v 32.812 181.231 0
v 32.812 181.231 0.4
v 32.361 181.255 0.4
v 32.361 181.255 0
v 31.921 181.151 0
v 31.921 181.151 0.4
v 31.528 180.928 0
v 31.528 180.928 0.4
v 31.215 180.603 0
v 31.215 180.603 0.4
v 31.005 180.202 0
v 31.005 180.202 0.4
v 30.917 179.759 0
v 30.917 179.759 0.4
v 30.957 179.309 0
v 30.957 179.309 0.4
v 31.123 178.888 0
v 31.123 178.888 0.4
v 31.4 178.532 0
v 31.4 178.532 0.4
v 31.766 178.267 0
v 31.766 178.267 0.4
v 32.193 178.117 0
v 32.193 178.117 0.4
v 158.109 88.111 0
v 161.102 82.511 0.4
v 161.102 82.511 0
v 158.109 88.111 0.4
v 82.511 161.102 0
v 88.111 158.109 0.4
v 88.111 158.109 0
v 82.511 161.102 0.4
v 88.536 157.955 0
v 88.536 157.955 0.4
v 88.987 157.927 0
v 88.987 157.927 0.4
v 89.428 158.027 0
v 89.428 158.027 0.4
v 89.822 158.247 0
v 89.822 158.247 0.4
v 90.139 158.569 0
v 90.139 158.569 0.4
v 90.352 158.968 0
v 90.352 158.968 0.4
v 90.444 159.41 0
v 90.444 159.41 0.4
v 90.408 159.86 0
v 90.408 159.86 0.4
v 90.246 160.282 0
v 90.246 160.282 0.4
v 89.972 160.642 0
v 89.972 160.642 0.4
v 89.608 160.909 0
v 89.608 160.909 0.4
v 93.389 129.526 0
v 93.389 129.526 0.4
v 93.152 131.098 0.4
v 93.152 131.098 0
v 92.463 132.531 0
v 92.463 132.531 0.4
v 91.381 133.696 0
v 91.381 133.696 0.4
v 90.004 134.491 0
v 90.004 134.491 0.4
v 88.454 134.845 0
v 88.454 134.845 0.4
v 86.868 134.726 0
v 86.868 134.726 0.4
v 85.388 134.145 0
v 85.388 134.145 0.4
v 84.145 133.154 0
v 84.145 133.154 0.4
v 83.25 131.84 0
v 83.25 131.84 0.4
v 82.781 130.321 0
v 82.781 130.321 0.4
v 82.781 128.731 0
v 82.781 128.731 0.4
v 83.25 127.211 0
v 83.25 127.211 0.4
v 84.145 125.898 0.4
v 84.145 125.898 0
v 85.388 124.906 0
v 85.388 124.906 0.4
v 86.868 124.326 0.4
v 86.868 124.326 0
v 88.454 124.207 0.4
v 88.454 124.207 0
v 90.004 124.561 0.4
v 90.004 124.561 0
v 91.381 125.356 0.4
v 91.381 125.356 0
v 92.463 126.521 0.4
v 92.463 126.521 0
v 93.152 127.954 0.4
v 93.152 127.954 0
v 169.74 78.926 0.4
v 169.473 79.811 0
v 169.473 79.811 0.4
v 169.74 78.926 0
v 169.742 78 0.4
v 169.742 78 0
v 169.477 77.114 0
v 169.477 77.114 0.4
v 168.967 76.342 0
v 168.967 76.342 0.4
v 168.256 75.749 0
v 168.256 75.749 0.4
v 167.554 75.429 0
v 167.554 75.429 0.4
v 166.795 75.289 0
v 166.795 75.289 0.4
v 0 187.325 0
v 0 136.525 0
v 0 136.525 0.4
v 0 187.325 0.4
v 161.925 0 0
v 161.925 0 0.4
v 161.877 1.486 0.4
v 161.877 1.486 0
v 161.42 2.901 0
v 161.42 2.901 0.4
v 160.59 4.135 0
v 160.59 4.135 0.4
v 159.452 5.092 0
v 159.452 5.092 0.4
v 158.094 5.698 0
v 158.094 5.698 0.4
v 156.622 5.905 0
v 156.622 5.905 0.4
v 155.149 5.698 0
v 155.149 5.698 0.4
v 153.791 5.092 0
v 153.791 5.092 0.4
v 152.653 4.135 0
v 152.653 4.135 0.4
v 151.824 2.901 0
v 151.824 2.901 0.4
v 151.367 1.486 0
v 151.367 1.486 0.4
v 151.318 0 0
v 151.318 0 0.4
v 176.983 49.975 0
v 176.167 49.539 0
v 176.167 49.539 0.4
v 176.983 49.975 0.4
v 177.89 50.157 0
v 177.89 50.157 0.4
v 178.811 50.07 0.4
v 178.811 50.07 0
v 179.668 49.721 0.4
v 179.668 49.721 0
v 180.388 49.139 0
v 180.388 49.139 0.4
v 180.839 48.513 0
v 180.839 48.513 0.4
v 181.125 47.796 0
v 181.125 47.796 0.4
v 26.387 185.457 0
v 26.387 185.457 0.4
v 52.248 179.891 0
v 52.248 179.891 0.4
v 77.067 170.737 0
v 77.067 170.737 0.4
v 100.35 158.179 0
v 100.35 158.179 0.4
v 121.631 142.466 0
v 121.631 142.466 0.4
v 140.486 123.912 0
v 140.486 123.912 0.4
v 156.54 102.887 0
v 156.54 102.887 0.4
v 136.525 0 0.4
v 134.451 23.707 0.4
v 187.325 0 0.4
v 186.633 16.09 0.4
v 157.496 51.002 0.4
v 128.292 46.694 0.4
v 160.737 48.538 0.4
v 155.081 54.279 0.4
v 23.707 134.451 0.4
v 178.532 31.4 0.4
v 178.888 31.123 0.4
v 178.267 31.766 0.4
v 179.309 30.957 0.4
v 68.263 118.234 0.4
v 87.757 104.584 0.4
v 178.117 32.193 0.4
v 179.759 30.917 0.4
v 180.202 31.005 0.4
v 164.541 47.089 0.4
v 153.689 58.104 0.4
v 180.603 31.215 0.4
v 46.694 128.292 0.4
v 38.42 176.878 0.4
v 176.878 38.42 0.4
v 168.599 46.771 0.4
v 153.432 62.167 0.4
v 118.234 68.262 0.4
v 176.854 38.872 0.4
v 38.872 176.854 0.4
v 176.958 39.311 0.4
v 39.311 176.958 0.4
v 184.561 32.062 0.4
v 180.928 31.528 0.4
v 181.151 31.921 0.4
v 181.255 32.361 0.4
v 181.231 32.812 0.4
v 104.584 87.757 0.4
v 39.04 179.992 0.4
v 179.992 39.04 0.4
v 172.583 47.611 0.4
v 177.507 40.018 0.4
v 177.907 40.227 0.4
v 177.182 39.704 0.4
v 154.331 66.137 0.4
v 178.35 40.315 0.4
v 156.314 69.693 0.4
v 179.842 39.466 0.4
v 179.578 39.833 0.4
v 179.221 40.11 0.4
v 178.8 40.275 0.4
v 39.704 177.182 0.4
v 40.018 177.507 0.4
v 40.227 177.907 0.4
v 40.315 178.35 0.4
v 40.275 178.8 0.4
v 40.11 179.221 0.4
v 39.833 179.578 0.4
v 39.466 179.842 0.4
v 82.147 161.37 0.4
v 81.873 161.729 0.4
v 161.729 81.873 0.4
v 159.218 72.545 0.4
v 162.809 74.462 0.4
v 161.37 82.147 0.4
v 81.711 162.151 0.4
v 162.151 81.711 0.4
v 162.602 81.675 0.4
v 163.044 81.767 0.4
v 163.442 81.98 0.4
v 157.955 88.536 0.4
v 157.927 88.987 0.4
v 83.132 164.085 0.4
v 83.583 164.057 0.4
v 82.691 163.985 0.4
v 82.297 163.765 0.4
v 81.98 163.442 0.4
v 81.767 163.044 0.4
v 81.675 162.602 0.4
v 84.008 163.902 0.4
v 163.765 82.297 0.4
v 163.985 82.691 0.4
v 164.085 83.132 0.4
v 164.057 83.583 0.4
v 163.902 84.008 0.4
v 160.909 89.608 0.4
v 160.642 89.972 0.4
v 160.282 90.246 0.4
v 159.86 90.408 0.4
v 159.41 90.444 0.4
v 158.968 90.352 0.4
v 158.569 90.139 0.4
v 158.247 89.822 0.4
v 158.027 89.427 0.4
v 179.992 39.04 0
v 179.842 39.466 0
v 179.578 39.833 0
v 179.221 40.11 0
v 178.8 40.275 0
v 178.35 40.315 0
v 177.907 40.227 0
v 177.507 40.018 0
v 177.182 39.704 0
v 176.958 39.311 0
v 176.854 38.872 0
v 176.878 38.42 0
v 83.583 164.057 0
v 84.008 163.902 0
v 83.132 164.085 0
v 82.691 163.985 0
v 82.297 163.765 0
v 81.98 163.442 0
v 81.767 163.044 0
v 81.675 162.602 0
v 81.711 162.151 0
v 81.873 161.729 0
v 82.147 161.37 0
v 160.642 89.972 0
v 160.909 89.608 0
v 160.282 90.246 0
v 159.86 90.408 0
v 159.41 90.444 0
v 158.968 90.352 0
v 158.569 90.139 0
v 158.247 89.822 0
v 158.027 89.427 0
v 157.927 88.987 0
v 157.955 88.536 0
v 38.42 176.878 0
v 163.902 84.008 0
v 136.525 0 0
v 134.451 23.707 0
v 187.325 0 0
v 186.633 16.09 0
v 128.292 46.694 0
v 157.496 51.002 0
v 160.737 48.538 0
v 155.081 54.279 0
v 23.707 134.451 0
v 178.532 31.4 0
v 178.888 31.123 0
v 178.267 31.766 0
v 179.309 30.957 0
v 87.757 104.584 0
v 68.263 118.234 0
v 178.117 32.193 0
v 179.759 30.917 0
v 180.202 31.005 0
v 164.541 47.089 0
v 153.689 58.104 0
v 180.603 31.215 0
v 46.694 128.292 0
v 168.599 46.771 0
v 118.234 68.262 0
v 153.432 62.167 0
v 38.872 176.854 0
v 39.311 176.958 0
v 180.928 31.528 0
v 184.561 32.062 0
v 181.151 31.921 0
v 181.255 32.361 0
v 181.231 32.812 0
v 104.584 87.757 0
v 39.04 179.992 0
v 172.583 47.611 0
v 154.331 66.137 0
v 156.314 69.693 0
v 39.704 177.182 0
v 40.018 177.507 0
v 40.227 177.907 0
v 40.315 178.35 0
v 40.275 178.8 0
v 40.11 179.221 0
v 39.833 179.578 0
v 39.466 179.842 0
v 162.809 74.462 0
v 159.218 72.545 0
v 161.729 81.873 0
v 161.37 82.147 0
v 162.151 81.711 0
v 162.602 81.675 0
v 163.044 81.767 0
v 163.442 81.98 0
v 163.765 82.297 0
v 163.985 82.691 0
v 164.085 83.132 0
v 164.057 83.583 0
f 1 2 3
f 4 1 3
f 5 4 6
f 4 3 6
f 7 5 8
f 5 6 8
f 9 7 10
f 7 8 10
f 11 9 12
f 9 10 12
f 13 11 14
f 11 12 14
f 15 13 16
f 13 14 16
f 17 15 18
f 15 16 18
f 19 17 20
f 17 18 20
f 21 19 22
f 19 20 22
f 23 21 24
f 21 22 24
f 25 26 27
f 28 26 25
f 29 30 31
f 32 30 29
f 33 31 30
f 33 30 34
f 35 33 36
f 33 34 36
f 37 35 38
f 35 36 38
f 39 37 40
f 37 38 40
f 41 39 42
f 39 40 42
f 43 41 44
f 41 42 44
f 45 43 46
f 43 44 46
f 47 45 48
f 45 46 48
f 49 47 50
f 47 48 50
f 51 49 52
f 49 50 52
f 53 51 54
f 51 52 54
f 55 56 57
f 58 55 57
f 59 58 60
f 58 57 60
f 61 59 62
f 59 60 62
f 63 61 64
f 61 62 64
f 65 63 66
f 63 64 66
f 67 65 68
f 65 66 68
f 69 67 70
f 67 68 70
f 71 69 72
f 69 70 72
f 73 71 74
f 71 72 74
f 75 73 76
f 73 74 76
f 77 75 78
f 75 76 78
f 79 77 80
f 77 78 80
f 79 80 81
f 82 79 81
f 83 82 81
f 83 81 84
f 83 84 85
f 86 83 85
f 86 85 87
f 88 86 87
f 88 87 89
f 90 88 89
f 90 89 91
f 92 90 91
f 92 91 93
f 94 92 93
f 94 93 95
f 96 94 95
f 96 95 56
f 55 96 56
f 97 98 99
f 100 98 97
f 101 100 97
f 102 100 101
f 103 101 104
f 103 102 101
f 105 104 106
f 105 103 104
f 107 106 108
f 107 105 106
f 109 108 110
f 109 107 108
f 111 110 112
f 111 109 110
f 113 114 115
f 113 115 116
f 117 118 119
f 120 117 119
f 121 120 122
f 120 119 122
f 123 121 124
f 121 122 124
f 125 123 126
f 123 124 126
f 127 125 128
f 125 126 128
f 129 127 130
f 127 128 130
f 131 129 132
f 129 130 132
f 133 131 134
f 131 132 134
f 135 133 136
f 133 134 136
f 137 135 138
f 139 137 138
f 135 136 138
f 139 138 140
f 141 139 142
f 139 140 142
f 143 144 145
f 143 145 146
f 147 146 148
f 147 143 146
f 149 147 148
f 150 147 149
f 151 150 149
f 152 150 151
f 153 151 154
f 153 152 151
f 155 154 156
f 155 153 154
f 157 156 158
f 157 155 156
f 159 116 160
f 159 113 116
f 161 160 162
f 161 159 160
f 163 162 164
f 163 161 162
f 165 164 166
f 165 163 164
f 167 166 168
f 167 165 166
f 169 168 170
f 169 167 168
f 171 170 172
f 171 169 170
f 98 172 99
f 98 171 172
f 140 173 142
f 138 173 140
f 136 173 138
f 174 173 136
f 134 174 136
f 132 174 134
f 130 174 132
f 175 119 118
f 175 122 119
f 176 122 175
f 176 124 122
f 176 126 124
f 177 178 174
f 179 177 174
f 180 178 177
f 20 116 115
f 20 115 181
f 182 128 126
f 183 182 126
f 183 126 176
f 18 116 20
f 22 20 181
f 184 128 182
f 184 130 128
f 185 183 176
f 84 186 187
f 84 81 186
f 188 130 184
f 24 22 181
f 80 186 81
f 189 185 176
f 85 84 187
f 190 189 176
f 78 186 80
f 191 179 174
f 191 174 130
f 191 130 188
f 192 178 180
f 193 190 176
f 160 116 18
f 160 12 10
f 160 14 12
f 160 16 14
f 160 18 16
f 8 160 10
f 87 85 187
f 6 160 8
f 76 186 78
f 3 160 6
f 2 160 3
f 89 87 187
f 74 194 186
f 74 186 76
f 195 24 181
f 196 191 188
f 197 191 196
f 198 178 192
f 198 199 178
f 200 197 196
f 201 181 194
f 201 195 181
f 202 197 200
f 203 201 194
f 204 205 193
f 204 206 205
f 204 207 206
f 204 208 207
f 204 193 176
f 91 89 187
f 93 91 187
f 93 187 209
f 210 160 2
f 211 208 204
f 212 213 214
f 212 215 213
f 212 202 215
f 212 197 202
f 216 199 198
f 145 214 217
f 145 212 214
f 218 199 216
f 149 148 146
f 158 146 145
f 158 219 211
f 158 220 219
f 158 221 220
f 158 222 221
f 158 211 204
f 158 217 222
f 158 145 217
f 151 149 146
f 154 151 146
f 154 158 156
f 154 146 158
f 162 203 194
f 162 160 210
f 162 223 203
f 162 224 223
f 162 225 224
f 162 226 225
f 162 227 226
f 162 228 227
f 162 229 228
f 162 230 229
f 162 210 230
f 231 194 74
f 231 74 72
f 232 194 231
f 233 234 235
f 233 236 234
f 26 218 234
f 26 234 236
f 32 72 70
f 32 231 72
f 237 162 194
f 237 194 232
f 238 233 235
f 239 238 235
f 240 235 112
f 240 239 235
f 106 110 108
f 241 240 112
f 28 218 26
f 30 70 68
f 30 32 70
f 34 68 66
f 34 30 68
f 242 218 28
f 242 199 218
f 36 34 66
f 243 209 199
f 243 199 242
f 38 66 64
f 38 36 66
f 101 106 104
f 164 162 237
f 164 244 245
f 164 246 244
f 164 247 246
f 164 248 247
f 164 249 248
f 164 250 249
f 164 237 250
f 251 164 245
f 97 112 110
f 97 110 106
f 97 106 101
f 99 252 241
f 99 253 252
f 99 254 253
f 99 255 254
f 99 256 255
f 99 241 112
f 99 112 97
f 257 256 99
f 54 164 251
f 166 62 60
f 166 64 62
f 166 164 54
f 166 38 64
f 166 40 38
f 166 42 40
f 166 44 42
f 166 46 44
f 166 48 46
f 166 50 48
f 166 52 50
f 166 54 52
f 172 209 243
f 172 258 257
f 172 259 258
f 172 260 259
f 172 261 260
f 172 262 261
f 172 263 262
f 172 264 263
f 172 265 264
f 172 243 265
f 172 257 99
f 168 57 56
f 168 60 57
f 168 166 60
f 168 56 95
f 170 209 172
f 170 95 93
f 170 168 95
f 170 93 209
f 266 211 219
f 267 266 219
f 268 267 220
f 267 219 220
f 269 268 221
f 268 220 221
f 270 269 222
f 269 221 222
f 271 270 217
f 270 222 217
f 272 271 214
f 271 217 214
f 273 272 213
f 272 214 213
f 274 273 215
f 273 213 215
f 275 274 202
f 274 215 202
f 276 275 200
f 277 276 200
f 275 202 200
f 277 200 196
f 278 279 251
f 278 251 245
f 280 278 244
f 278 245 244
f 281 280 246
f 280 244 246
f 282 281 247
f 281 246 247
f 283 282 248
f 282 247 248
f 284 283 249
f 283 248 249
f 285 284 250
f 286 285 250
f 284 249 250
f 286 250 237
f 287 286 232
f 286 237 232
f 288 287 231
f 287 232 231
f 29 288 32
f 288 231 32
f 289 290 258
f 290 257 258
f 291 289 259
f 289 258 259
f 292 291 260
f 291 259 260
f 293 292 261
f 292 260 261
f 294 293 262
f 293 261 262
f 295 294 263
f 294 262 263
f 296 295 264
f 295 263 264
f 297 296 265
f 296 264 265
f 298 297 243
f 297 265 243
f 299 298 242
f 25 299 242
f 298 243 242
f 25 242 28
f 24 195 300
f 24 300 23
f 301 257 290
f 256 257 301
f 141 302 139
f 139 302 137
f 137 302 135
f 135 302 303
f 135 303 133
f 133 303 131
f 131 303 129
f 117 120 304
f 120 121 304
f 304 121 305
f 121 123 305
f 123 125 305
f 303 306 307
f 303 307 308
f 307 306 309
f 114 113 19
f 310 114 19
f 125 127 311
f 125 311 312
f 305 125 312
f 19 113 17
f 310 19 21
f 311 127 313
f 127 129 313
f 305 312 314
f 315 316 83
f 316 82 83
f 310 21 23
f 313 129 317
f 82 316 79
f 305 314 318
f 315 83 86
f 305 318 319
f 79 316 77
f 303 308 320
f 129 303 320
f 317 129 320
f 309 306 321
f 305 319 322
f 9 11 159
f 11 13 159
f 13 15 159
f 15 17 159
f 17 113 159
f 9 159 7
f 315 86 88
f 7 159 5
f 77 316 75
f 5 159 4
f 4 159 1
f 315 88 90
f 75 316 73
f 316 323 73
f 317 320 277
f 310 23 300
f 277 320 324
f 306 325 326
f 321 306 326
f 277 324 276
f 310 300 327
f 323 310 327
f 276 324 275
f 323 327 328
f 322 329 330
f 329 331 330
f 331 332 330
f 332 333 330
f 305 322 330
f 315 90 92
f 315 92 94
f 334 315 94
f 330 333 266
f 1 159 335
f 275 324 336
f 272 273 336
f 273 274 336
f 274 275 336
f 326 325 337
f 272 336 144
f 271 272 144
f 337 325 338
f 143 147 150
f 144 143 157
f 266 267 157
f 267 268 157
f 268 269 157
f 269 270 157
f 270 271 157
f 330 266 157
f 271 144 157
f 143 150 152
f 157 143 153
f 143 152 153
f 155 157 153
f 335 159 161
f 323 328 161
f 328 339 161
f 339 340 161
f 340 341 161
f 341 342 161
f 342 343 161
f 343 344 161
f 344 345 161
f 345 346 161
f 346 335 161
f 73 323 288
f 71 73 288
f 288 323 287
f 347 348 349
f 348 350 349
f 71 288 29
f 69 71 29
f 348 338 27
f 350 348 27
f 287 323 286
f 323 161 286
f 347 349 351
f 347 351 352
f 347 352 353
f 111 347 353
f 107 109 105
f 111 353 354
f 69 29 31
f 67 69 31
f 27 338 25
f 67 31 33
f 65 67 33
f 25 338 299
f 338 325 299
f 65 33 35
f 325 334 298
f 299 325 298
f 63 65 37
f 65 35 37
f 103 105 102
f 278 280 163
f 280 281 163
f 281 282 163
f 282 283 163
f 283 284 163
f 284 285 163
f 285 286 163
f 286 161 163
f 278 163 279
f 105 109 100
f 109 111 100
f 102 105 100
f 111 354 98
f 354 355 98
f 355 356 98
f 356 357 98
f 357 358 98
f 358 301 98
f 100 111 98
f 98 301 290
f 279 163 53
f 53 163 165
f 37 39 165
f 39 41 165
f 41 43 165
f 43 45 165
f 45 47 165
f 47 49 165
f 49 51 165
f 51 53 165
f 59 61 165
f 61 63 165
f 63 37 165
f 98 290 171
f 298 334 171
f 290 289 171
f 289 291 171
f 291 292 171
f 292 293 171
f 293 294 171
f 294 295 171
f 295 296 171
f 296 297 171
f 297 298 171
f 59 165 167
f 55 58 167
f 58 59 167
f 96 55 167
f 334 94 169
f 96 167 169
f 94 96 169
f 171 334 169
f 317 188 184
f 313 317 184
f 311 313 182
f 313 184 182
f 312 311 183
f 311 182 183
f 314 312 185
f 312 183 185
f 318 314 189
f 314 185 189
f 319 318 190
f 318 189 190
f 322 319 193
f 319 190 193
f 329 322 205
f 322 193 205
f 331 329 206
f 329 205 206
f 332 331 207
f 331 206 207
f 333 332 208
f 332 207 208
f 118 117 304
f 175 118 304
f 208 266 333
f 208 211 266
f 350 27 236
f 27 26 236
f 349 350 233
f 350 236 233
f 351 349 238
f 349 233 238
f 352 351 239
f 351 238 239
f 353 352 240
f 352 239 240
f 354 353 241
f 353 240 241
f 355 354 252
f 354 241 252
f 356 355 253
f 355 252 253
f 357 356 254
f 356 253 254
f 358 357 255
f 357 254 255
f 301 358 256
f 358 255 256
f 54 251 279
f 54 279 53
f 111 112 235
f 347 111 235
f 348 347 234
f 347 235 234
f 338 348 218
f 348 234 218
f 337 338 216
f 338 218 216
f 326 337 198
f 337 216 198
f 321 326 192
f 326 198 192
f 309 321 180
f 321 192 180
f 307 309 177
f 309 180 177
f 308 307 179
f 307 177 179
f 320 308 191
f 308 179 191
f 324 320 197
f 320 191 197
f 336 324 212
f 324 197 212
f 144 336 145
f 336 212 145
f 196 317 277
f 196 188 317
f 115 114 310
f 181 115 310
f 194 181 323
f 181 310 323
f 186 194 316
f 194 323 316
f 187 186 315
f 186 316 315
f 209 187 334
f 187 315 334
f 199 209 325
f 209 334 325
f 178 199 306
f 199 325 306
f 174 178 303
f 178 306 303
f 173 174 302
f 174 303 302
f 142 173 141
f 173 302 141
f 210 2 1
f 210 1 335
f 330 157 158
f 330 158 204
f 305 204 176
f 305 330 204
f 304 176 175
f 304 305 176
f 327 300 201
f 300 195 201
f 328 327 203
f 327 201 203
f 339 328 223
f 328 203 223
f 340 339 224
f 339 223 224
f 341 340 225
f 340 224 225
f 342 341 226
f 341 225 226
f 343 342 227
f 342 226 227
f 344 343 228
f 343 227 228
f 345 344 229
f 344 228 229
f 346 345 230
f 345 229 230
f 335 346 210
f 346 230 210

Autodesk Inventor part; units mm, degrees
ref_plane "YZ Plane" through (0, 0, 0) normal (1, 0, 0) x (0, 1, 0)
ref_plane "XZ Plane" through (0, 0, 0) normal (0, 1, 0) x (-1, 0, 0)
ref_plane "XY Plane" through (0, 0, 0) normal (0, 0, 1) x (1, 0, 0)
sketch "Sketch1" plane through (0, 0, 0) normal (0, 0, 1) x (1, 0, 0)
  arc A0 (187.325, 0) -> (0, 187.325) centre (0, 0) ccw
  arc A1 (136.525, 0) -> (0, 136.525) centre (0, 0) ccw
  line L0 (0, 136.525) -> (0, 187.325)
  line L1 (136.525, 0) -> (187.325, 0)
  point P0 (161.925, 0)
  point P1 (0, 161.925)
  dimension "d2" = 187.325
  dimension "d3" = 136.525
extrude "Extrusion1" add sketch "Sketch1" along normal blind 0.4
sketch "Sketch3" plane through (0, 0, 0.4) normal (0, 0, 1) x (1, 0, 0)
  arc A0 (178.117, 32.1925) -> (181.231, 32.8119) centre (179.674, 32.5022) ccw projected
  line L0 (179.9922, 39.0399) -> (181.231, 32.8119) projected
  arc A1 (179.9922, 39.0399) -> (176.8782, 38.4205) centre (178.4352, 38.7302) ccw projected
  line L1 (178.117, 32.1925) -> (176.8782, 38.4205) projected
  line L2 (161.1024, 82.5109) -> (158.109, 88.1111) projected
  arc A2 (161.1024, 82.5109) -> (163.9025, 84.0076) centre (162.5024, 83.2593) ccw projected
  line L3 (160.9091, 89.6078) -> (163.9025, 84.0076) projected
  arc A3 (160.9091, 89.6078) -> (158.109, 88.1111) centre (159.5091, 88.8595) ccw projected
  circle A4 centre (156.6217, 0.5713) radius 5.334 projected
  line L4 (84.0076, 163.9025) -> (89.6078, 160.9091) projected
  arc A5 (88.1111, 158.109) -> (89.6078, 160.9091) centre (88.8595, 159.5091) ccw projected
  line L5 (88.1111, 158.109) -> (82.5109, 161.1024) projected
  arc A6 (84.0076, 163.9025) -> (82.5109, 161.1024) centre (83.2593, 162.5024) ccw projected
  line L6 (32.8119, 181.231) -> (39.0399, 179.9922) projected
  arc A7 (38.4205, 176.8782) -> (39.0399, 179.9922) centre (38.7302, 178.4352) ccw projected
  line L7 (38.4205, 176.8782) -> (32.1925, 178.117) projected
  arc A8 (32.8119, 181.231) -> (32.1925, 178.117) centre (32.5022, 179.674) ccw projected
  circle A9 centre (88.0554, 129.5258) radius 5.334 projected
  circle A10 centre (167.6741, 61.0284) radius 8.89 projected
  circle A11 centre (167.6741, 61.0284) radius 14.2875
  point P0 (0, 0)
  dimension "d10" = 28.575
extrude "Extrusion2" cut sketch "Sketch3" against normal through all contours L1 A1 L0 A0 | L2 A3 L3 A2 | A4 | L4 A5 L5 A6 | L6 A7 L7 A8 | A9 | A10 | A11
fillet "Fillet1" radius 3.175 2 edges at (171.7808, 74.7129, 0.2) (179.6163, 53.1851, 0.2)
properties part number "3DPRINT,CABLE,TRAY" material "ABS Plastic"
